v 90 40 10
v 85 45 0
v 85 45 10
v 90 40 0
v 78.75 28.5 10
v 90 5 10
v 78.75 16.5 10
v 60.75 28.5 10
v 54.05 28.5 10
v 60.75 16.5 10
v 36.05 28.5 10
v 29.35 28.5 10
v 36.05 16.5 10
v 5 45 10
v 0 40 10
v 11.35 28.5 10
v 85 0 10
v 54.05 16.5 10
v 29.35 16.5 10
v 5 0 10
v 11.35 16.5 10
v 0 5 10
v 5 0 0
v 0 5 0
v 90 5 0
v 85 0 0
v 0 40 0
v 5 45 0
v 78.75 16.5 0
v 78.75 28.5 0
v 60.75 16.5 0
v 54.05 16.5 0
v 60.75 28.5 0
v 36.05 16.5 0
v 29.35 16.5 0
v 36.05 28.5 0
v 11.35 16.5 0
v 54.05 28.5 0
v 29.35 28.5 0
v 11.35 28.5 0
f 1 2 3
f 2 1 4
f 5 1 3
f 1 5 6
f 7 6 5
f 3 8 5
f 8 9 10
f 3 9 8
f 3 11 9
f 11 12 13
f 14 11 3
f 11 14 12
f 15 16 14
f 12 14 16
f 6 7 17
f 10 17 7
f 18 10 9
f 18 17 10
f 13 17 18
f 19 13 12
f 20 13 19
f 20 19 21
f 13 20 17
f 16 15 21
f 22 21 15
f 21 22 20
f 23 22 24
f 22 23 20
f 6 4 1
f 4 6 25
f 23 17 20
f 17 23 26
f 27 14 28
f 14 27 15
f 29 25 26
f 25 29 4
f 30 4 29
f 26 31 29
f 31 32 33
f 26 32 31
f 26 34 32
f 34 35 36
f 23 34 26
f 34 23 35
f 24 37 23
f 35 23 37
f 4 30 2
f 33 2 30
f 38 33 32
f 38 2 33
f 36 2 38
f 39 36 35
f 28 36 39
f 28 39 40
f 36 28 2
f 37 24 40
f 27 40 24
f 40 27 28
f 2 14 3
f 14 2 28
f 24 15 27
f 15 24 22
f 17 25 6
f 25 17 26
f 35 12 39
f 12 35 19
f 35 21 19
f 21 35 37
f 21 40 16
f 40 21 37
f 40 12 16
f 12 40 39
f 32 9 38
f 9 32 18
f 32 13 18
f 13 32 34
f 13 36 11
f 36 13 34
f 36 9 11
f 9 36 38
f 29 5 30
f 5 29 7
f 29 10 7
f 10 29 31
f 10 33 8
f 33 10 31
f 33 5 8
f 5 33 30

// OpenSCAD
$fn = 32;

// ----------------------------------------------------------------------
// Windowed plate: 3 voids, 90 x 45 x 10 mm
// ----------------------------------------------------------------------

// --- parameters (mm) ---
plate_l = 90;             // plate length, X
plate_w = 45;             // plate width, Y
plate_t = 10;             // plate thickness, Z
edge_margin = 8;          // wall from the plate edge to any window
windows = 3;              // number of windows in the row
win_l = 18;               // window length
win_w = 12;               // window width
win_pitch = 24.7;         // window pitch along X
depth_1 = 10;             // depth of void 1 (full thickness = through)
depth_2 = 10;             // depth of void 2 (full thickness = through)
depth_3 = 10;             // depth of void 3 (full thickness = through)
corner_c = 5;             // corner chamfer of the plate

profile = [[5, 0], [85, 0], [90, 5], [90, 40], [85, 45], [5, 45], [0, 40], [0, 5]];  // primary outline, 8 points, counter clockwise
void_1 = [[11.35, 16.5], [29.35, 16.5], [29.35, 28.5], [11.35, 28.5]];  // window 1 of the row, 4 points
void_2 = [[36.05, 16.5], [54.05, 16.5], [54.05, 28.5], [36.05, 28.5]];  // window 2 of the row, 4 points
void_3 = [[60.75, 16.5], [78.75, 16.5], [78.75, 28.5], [60.75, 28.5]];  // window 3 of the row, 4 points

// --- the one profile operation ---
difference() {
  linear_extrude(height = plate_t) polygon(points = profile);
  translate([0, 0, -1])
    linear_extrude(height = plate_t + 2) polygon(points = void_1);
  translate([0, 0, -1])
    linear_extrude(height = plate_t + 2) polygon(points = void_2);
  translate([0, 0, -1])
    linear_extrude(height = plate_t + 2) polygon(points = void_3);
}
